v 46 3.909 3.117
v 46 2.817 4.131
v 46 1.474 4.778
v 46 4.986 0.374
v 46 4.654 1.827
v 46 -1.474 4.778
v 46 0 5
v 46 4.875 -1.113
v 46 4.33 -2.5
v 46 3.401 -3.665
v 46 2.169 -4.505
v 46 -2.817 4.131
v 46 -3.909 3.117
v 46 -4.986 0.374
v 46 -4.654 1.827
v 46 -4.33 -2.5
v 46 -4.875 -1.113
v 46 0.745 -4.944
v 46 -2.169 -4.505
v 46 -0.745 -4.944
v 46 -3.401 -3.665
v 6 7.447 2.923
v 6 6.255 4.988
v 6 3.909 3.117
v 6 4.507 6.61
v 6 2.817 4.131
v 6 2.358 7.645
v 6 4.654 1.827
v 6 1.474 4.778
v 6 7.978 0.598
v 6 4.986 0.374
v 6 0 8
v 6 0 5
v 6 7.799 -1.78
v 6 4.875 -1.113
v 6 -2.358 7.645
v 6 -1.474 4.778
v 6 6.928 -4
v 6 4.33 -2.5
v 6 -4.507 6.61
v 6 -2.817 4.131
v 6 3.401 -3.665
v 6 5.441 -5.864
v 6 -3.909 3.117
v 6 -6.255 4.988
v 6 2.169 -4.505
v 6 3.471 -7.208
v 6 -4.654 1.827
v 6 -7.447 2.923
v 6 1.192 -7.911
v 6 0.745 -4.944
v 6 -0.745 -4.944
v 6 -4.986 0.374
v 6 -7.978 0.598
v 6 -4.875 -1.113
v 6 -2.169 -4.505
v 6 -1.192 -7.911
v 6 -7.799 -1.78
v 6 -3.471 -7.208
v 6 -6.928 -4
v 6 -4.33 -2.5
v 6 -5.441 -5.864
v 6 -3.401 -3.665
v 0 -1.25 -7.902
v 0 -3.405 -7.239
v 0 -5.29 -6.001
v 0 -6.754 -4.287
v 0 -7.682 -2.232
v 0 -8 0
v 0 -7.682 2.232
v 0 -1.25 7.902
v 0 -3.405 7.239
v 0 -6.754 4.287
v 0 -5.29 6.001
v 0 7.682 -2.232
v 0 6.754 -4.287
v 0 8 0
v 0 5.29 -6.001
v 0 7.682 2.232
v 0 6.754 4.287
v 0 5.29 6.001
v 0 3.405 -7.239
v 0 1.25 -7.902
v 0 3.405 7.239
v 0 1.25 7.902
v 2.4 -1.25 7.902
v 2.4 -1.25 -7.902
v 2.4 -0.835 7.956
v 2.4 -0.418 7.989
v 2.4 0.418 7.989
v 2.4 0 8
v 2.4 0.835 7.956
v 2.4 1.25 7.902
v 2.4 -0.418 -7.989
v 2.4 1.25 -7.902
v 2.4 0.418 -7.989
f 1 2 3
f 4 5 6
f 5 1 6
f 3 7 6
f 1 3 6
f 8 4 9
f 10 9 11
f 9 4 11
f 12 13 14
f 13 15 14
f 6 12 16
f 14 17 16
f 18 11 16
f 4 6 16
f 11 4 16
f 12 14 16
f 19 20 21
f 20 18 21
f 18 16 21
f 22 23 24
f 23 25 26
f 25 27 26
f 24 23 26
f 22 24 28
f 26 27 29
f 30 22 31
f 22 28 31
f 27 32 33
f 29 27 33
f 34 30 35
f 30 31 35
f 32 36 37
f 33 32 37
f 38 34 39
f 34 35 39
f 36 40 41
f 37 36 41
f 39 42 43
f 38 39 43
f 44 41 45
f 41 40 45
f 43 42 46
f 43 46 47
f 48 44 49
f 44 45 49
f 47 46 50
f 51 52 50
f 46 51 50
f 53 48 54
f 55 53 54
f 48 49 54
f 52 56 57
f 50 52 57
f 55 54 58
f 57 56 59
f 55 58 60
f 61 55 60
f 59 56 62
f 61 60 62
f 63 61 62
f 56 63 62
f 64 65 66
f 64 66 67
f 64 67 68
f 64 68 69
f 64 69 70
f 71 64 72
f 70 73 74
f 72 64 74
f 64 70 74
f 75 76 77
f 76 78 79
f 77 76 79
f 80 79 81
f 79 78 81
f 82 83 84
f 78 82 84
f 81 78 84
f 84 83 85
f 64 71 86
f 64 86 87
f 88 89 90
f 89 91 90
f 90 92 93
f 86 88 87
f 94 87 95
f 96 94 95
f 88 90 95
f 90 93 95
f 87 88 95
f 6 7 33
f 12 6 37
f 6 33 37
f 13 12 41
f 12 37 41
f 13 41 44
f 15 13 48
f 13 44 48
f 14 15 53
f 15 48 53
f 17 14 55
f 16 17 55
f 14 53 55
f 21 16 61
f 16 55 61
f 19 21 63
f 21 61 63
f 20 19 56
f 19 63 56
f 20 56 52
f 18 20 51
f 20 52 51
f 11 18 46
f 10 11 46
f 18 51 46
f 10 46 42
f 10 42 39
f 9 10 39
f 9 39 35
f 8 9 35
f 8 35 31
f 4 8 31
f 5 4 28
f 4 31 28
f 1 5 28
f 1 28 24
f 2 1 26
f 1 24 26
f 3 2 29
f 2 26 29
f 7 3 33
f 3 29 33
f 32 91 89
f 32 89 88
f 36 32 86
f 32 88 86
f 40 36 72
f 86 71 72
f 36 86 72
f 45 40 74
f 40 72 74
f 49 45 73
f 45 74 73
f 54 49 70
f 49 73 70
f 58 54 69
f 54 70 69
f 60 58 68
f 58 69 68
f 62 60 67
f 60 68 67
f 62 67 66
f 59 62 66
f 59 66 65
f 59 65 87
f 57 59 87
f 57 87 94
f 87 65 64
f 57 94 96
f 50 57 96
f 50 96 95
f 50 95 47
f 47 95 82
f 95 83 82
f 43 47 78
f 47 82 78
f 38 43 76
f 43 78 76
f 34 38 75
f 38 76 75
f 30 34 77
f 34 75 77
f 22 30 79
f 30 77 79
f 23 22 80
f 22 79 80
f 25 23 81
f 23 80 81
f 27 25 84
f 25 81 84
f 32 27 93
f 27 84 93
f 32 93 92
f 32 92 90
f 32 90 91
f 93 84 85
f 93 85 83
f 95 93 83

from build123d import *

# Parameters (mm, degrees)
SKETCH2_W  = 16
SKETCH2_H  = 2.5
SLOT_DEPTH = 2.4


with BuildPart() as part:
    # BodySke → Base-Revolve (revolve)
    with BuildSketch(Plane.XY, mode=Mode.PRIVATE) as base_revolve_sk:
        Polygon((6, 5), (6, 8), (0, 8), (0, 0), (46, 0), (46, 5), align=None)
    revolve(base_revolve_sk.sketch.rotate(Axis((-25.4, 0, 0), (1, 0, 0)), 90), axis=Axis((-25.4, 0, 0), (1, 0, 0)))

    # Sketch2 → Slot (cut)
    with BuildSketch(Plane(origin=(0, 0, 0), x_dir=(0, 0, -1), z_dir=(1, 0, 0))):
        Rectangle(SKETCH2_W, SKETCH2_H)
    extrude(amount=SLOT_DEPTH, mode=Mode.SUBTRACT)


solid = part.part
